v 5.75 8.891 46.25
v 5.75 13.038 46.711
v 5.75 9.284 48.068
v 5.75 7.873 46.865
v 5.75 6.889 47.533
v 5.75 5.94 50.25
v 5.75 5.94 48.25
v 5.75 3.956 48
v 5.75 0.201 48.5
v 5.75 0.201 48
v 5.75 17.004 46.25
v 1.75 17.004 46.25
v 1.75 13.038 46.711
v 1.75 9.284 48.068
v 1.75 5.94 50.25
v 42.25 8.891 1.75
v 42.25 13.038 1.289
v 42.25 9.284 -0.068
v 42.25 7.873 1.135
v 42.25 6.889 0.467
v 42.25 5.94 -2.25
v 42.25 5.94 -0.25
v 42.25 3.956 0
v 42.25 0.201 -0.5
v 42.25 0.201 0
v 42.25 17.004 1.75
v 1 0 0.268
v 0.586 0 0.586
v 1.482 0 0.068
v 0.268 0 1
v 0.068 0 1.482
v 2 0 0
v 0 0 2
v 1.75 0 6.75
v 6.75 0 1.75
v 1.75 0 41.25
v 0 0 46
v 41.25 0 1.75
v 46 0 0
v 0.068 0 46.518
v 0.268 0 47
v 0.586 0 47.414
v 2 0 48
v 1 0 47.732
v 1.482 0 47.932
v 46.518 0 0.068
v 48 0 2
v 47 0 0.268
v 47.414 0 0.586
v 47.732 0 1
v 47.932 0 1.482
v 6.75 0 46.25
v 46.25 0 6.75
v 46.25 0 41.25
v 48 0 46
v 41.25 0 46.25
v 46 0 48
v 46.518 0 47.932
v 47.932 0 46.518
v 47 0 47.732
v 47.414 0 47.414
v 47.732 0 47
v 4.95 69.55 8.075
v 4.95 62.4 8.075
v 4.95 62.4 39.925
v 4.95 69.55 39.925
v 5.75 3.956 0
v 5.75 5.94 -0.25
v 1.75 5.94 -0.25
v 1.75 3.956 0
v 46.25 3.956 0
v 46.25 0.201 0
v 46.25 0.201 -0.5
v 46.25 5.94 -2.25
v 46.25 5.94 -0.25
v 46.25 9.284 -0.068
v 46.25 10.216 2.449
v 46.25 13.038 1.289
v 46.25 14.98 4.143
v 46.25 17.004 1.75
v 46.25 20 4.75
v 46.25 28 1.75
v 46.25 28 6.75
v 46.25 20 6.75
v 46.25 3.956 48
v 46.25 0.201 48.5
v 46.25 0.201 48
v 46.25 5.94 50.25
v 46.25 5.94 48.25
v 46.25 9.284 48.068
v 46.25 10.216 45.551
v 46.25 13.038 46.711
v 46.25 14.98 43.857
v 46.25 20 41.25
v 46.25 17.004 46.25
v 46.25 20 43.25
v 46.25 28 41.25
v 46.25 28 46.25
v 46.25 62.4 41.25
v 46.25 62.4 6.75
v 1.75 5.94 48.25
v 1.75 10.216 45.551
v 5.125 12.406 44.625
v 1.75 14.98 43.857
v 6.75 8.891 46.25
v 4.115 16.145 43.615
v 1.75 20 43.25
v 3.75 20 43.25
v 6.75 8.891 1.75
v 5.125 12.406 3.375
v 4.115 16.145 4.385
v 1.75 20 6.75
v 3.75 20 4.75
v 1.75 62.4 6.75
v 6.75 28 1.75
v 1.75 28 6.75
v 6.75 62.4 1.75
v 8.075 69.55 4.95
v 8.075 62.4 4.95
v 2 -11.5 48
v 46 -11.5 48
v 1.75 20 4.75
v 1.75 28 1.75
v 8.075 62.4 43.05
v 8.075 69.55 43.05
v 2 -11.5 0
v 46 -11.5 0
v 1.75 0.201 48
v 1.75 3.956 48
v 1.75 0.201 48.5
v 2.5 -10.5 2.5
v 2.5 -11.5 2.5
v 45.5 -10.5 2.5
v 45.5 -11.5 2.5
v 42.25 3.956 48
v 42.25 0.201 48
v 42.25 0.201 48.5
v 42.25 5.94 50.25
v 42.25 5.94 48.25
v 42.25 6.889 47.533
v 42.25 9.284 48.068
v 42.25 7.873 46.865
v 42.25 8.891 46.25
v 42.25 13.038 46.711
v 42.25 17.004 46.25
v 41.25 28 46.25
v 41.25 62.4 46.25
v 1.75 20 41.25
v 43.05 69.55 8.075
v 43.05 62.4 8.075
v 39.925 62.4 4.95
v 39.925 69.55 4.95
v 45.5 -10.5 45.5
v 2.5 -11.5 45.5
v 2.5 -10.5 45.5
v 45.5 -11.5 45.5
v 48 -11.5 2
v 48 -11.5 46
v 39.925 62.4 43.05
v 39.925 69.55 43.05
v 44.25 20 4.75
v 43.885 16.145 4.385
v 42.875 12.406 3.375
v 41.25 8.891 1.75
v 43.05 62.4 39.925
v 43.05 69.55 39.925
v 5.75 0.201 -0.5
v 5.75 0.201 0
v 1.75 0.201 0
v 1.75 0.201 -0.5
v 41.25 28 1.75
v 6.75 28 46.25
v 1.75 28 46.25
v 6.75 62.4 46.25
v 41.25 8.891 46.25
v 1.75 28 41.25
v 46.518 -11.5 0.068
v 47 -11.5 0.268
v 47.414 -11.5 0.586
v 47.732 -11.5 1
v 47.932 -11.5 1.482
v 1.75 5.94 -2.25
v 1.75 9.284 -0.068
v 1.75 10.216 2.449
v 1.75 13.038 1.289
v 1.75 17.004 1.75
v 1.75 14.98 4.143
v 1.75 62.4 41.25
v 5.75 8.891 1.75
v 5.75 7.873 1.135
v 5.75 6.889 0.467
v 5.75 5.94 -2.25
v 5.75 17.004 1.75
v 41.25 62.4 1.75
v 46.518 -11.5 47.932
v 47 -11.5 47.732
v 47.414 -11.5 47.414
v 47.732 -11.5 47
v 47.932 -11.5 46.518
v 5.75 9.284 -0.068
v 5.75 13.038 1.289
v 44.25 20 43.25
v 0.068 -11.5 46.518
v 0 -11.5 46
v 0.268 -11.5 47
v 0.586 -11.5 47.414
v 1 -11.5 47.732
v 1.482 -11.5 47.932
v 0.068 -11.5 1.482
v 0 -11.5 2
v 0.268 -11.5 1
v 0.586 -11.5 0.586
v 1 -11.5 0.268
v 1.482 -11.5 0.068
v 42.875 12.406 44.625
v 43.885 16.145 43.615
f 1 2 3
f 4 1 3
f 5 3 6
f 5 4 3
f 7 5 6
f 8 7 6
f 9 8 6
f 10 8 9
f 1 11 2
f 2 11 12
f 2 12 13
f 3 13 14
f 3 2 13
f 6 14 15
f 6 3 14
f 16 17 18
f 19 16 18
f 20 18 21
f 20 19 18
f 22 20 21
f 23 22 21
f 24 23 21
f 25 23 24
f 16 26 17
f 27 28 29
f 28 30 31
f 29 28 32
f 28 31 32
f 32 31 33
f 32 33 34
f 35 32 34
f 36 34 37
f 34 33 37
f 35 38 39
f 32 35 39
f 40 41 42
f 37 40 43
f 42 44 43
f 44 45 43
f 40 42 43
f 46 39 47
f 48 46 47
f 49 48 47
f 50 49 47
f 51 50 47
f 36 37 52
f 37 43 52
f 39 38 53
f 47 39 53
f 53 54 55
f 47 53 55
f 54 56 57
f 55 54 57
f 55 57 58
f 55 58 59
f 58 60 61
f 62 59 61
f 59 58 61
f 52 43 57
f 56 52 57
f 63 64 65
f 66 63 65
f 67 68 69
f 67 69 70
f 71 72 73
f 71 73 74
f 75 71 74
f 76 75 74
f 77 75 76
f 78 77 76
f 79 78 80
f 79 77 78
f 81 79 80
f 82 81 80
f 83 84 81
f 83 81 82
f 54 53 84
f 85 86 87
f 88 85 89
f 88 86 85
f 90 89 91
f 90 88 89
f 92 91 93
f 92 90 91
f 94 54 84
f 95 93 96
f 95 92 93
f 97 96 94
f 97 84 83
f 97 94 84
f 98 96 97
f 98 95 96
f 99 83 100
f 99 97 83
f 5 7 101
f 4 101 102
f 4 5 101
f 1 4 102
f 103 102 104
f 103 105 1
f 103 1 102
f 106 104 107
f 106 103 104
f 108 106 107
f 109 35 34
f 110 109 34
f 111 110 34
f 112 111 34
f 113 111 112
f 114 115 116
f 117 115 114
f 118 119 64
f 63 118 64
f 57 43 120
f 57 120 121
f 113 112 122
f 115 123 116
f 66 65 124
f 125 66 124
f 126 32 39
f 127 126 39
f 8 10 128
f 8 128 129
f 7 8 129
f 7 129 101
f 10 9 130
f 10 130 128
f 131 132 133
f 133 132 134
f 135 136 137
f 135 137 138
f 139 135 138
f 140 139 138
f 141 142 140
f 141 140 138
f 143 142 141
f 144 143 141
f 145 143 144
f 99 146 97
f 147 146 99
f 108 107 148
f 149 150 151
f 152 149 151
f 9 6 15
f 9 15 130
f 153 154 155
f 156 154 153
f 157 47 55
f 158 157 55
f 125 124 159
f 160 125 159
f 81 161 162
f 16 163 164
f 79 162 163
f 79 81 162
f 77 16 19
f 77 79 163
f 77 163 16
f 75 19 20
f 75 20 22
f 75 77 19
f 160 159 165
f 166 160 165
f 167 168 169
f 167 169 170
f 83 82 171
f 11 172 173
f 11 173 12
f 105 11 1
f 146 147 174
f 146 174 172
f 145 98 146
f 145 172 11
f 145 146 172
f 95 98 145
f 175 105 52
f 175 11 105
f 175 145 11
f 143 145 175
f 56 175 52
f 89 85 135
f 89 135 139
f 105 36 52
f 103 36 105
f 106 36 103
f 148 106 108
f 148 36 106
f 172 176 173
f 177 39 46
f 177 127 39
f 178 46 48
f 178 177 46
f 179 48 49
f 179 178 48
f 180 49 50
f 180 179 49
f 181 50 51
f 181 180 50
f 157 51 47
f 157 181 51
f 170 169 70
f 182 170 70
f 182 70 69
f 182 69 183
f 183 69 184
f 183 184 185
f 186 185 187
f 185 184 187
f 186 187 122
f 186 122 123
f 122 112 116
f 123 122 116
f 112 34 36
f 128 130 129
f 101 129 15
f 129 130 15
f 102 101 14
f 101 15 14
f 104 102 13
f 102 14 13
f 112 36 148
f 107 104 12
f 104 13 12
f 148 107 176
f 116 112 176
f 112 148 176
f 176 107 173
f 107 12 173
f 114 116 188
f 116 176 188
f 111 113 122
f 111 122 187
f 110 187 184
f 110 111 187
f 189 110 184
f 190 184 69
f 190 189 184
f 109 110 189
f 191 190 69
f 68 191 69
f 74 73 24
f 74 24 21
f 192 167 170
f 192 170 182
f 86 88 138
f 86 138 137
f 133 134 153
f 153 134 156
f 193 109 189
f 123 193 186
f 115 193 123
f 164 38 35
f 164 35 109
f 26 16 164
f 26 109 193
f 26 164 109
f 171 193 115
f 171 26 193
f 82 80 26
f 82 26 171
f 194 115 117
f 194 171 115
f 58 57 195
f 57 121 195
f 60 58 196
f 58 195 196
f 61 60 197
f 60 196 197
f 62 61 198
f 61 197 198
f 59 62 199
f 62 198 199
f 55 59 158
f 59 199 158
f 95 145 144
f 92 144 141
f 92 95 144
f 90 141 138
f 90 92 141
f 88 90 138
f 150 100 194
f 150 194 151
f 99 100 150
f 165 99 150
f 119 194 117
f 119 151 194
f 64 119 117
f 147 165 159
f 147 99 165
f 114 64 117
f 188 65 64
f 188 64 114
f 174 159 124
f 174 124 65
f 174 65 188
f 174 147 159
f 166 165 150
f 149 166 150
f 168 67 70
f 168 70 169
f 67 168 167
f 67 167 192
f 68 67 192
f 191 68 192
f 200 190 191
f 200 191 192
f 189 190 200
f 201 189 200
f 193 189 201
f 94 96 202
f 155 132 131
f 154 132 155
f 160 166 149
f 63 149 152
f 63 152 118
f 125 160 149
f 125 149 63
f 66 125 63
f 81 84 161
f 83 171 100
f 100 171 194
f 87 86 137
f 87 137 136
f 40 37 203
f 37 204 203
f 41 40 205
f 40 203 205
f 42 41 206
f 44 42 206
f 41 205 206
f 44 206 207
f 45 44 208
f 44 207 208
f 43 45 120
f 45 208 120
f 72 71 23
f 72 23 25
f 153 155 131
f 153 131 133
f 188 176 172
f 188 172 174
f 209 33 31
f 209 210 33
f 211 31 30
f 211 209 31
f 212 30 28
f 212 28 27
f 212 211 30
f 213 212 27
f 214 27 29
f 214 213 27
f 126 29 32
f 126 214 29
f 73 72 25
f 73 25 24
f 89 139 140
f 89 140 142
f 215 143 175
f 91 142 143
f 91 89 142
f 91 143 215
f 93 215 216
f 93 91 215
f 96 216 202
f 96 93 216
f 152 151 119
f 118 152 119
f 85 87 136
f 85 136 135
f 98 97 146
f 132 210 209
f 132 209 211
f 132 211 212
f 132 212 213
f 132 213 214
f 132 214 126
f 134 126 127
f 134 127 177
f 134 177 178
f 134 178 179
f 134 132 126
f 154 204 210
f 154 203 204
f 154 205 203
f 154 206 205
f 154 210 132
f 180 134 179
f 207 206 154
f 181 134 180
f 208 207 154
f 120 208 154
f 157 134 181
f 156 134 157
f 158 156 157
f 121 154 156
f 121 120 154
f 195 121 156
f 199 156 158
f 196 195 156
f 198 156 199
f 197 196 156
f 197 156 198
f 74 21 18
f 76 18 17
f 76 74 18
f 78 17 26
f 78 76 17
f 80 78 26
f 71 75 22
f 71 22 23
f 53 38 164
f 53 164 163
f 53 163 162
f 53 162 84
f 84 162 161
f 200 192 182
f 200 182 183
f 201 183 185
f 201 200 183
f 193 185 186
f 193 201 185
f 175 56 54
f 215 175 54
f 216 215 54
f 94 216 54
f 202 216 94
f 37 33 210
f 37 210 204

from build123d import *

# Parameters (mm, degrees)
F0_W      = 48
F0_H      = 48
F1_DEPTH  = 11.5
F2_W      = 43
F2_H      = 43
F3_DEPTH  = 1
F4_R      = 2
F5_W      = 44.5
F5_H      = 44.5
F6_DEPTH  = 62.4
F7_SIZE   = 5
F9_DEPTH  = 7.15
F11_DEPTH = 44.5
F13_DEPTH = 25
F15_DEPTH = 25


with BuildPart() as f1:
    # F0 (on Front) → F1 (new body)
    with BuildSketch(Plane.XZ):
        with Locations((24, 24)):
            Rectangle(F0_W, F0_H)
    extrude(amount=F1_DEPTH)

    # F2 (on face) → F3 (cut)
    with BuildSketch(Plane.XZ.offset(11.5)):
        with Locations((24, 24)):
            Rectangle(F2_W, F2_H)
    extrude(amount=-F3_DEPTH, mode=Mode.SUBTRACT)

    # F4
    f4_edges = [f1.edges().sort_by_distance(p)[0] for p in [
        (0, -5.75, 48),
        (48, -5.75, 48),
        (48, -5.75, 0),
        (0, -5.75, 0),
    ]]
    fillet(f4_edges, radius=F4_R)

    # F5 (on face) → F6 (join)
    with BuildSketch(Plane(origin=(0, 0, 0), x_dir=(-1, 0, 0), z_dir=(0, 1, 0))):
        with Locations((-24, 24)):
            Rectangle(F5_W, F5_H)
    extrude(amount=F6_DEPTH)

    # F7
    f7_edges = [f1.edges().sort_by_distance(p)[0] for p in [
        (46.25, 31.2, 46.25),
        (1.75, 31.2, 46.25),
        (46.25, 31.2, 1.75),
        (1.75, 31.2, 1.75),
    ]]
    chamfer(f7_edges, length=F7_SIZE)

    # F8 (on face) → F9 (join)
    with BuildSketch(Plane(origin=(0, 62.4, 0), x_dir=(-1, 0, 0), z_dir=(0, 1, 0))):
        Polygon((-4.95, 8.075483), (-4.95, 39.924517), (-8.075483, 43.05), (-39.924517, 43.05), (-43.05, 39.924517), (-43.05, 8.075483), (-39.924517, 4.95), (-8.075483, 4.95), align=None)
    extrude(amount=F9_DEPTH)

    # F10 (on face) → F11 (join, through all)
    with BuildSketch(Plane.YZ.offset(46.25)):
        with BuildLine():
            Line((20, 43.25), (20, 41.25))
            Line((20, 41.25), (28, 41.25))
            Line((28, 41.25), (28, 46.25))
            Line((28, 46.25), (20, 46.25))
            Line((20, 46.25), (17.004263, 46.25))
            ThreePointArc((17.004263, 46.25), (11.12186, 47.280701), (5.940328, 50.25))
            Line((5.940328, 50.25), (0.201208, 48.5))
            Line((0.201208, 48.5), (0.201208, 48))
            Line((0.201208, 48), (3.956015, 48))
            Line((3.956015, 48), (5.940328, 48.25))
            ThreePointArc((5.940328, 48.25), (12.551397, 44.572455), (20, 43.25))
        make_face()
        with BuildLine():
            Line((3.956015, 0), (0.201208, 0))
            Line((0.201208, 0), (0.201208, -0.5))
            Line((0.201208, -0.5), (5.940328, -2.25))
            ThreePointArc((5.940328, -2.25), (11.12186, 0.719299), (17.004263, 1.75))
            Line((17.004263, 1.75), (20, 1.75))
            Line((20, 1.75), (28, 1.75))
            Line((28, 1.75), (28, 6.75))
            Line((28, 6.75), (20, 6.75))
            Line((20, 6.75), (20, 4.75))
            ThreePointArc((20, 4.75), (12.551397, 3.427545), (5.940328, -0.25))
            Line((5.940328, -0.25), (3.956015, 0))
        make_face()
    extrude(amount=-F11_DEPTH)

    # F12 (on face) → F13 (cut)
    with BuildSketch(Plane.XY.offset(46.25)):
        Polygon((41.25, 17.004263), (41.25, 28), (24, 28), (6.75, 28), (6.75, 17.004263), (5.75, 17.004263), (5.75, 0), (6.75, 0), (41.25, 0), (42.25, 0), (42.25, 17.004263), align=None)
    extrude(amount=F13_DEPTH, mode=Mode.SUBTRACT)

    # F14 (on face) → F15 (cut)
    with BuildSketch(Plane(origin=(0, 0, 1.75), x_dir=(1, 0, 0), z_dir=(0, 0, -1))):
        Polygon((41.25, -17.004263), (42.25, -17.004263), (42.25, 0), (41.25, 0), (6.75, 0), (5.75, 0), (5.75, -17.004263), (6.75, -17.004263), (6.75, -28), (41.25, -28), align=None)
    extrude(amount=F15_DEPTH, mode=Mode.SUBTRACT)


solid = f1.part
